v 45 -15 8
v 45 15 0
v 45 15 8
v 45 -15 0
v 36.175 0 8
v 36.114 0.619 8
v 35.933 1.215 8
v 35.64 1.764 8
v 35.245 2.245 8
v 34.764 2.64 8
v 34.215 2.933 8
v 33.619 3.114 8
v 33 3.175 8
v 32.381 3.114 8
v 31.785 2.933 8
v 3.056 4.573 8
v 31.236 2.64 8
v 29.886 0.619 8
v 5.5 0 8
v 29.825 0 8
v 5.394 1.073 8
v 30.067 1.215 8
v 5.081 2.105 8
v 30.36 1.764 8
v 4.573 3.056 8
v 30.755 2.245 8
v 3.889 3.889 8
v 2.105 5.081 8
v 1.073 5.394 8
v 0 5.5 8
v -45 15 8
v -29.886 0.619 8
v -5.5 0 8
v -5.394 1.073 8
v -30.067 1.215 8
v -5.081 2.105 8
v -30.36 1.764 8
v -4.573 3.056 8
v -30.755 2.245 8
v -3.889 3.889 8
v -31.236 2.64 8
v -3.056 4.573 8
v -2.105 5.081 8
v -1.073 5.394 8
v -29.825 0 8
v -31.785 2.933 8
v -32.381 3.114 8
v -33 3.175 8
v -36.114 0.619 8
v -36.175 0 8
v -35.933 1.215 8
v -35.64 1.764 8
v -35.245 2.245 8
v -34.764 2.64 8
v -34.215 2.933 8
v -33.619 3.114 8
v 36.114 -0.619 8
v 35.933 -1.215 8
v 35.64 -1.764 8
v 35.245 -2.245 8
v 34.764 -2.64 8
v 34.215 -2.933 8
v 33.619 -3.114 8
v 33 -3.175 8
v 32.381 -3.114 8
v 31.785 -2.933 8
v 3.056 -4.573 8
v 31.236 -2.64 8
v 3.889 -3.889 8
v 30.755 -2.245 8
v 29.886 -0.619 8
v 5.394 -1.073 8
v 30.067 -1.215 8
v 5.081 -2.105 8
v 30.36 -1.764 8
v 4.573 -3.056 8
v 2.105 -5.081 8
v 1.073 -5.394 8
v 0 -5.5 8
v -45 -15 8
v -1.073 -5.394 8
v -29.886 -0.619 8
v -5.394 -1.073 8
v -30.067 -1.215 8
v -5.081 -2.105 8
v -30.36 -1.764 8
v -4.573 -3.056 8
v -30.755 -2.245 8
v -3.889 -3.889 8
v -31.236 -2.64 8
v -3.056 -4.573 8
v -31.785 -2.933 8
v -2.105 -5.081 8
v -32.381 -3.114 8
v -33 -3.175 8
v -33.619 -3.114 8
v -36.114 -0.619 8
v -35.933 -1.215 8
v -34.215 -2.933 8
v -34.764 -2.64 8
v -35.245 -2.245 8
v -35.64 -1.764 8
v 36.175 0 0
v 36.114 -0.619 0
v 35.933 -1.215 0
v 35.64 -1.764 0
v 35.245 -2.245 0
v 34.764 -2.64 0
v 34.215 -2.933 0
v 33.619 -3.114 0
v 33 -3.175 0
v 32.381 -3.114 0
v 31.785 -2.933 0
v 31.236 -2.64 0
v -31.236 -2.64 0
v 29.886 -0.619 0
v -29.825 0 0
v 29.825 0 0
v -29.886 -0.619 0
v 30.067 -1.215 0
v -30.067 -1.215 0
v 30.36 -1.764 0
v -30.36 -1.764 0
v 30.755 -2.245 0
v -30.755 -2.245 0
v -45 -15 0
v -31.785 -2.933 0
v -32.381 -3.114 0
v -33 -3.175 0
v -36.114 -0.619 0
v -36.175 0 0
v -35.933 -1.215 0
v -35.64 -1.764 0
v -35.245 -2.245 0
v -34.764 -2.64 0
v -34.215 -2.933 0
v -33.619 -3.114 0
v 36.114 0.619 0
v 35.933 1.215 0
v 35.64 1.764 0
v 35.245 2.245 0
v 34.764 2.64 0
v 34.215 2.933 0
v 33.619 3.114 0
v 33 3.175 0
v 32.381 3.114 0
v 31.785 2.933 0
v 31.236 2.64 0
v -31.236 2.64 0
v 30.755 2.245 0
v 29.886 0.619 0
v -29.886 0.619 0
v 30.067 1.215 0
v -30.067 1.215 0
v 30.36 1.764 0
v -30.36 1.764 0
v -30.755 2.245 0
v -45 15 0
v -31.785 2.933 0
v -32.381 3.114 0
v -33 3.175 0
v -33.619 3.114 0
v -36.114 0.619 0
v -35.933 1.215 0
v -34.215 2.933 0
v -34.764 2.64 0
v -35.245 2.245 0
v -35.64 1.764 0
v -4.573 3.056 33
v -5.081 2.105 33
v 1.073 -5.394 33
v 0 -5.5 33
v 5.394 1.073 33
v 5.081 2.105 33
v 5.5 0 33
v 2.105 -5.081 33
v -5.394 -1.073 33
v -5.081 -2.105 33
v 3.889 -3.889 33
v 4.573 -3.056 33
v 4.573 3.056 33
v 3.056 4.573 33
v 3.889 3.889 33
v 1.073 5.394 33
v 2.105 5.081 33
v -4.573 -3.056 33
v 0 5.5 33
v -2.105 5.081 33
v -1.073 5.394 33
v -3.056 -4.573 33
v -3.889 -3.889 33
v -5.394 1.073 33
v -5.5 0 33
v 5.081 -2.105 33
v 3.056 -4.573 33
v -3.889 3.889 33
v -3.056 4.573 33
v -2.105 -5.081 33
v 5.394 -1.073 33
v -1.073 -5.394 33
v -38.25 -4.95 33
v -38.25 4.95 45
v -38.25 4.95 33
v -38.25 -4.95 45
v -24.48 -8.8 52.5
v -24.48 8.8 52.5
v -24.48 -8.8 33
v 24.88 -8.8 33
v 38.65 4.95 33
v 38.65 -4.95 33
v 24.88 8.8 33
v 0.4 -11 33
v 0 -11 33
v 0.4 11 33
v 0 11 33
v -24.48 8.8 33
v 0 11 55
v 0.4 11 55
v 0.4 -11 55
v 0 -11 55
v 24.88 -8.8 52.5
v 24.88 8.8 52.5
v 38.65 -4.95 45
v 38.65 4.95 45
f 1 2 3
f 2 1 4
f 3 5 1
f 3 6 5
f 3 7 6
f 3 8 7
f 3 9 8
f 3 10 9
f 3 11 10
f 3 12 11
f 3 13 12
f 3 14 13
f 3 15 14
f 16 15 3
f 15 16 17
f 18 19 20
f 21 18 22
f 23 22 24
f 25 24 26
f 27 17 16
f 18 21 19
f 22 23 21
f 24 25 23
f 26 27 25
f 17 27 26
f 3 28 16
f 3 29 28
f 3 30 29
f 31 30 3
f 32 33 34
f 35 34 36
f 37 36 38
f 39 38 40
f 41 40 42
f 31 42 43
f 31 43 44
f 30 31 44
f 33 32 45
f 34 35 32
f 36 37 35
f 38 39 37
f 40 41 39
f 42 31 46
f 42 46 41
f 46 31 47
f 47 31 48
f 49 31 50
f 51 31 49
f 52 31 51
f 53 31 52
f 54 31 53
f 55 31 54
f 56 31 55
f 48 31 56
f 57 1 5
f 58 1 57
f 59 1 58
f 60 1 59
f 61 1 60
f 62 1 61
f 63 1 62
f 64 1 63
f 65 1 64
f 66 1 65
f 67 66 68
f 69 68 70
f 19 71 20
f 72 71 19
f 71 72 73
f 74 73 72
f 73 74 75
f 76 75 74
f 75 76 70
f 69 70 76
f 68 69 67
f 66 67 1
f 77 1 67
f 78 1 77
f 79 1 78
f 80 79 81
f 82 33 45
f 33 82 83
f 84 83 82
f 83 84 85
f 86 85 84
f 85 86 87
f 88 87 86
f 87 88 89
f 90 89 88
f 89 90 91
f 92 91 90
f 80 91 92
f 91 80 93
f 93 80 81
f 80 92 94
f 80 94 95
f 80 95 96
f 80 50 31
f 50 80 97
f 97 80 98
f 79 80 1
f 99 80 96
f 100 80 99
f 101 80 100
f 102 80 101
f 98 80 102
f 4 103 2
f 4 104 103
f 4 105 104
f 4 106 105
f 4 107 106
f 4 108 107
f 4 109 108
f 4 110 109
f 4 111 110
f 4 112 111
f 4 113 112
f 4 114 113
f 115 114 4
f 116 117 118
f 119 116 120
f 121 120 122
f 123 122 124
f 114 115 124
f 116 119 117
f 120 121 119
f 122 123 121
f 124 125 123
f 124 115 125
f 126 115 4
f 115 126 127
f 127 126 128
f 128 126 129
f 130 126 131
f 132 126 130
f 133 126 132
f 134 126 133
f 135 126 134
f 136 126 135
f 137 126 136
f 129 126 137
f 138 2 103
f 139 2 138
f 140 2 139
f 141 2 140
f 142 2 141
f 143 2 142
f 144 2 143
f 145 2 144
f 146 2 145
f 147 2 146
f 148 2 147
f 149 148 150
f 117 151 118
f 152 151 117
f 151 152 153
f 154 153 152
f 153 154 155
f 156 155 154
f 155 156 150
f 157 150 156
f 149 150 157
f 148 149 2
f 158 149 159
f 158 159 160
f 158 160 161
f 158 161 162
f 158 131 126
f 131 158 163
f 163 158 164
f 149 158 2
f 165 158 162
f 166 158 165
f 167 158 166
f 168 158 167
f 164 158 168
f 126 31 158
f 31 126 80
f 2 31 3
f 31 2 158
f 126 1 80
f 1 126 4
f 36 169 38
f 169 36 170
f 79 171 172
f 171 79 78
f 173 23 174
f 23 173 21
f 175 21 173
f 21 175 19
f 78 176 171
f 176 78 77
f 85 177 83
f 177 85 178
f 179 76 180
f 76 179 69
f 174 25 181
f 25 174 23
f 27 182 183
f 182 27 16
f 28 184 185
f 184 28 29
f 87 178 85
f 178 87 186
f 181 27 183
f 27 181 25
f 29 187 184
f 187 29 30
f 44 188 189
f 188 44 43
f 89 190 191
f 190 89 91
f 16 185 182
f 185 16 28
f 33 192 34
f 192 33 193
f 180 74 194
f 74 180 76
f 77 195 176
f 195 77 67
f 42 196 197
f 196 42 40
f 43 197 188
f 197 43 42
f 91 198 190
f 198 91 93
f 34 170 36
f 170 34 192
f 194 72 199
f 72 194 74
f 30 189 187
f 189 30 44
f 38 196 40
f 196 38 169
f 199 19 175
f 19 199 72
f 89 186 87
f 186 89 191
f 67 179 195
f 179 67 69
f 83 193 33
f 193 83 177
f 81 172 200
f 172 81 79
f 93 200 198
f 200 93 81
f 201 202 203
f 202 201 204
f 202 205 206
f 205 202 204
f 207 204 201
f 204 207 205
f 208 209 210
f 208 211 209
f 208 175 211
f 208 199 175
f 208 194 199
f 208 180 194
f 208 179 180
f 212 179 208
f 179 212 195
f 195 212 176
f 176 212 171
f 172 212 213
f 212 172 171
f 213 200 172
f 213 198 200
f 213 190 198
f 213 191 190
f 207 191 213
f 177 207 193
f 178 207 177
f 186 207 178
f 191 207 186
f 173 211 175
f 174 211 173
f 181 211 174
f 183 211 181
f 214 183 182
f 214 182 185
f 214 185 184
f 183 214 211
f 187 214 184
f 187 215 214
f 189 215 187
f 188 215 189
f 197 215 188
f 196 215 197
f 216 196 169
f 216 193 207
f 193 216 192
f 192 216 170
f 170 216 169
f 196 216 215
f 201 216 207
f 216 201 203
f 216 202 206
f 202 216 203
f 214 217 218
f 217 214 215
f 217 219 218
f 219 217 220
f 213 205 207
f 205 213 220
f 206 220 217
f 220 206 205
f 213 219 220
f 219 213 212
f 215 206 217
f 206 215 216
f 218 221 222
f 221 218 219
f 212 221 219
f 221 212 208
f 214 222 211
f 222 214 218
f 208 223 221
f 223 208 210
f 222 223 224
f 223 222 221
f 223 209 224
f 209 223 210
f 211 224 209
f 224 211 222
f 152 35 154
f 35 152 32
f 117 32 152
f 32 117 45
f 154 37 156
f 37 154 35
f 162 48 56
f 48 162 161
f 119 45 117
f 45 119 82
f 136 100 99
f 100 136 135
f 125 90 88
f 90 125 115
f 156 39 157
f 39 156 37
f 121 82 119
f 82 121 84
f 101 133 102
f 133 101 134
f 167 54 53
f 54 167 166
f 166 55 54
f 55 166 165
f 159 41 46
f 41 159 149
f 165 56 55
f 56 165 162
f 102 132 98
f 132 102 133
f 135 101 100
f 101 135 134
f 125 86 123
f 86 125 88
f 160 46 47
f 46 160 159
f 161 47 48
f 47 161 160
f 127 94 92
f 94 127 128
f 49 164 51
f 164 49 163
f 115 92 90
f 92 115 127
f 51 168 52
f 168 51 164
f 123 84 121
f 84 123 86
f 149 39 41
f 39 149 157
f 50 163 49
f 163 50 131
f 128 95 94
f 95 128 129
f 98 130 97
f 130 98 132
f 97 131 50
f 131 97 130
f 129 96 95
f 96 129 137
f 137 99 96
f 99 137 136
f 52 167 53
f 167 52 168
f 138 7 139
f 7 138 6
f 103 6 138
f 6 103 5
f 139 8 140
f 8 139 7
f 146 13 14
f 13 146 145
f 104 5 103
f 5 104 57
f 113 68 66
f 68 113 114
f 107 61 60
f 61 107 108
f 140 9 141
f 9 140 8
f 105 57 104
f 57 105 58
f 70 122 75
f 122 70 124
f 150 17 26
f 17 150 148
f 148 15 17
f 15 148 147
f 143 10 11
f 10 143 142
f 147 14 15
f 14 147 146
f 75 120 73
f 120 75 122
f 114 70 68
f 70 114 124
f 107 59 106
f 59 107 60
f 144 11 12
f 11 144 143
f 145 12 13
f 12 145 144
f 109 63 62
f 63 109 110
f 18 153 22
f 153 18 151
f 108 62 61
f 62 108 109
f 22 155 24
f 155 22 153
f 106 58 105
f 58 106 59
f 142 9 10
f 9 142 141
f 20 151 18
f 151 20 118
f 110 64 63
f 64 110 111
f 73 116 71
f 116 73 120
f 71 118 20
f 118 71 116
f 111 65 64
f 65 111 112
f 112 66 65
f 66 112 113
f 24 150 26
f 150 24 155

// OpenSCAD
$fn = 32;

// ----------------------------------------------------------------------
// Boat cleat: 90 mm base, horn 44 mm up
// ----------------------------------------------------------------------

// --- parameters (mm) ---
base_l = 90;              // base length
base_w = 30;              // base width
base_t = 8;               // base thickness
horn_len = 76.5;          // horn length
horn_d = 22;              // horn diameter at the middle
horn_z = 44;              // horn axis height
end_drop = 10;            // how far the horn tips drop
post_d = 11;              // centre post diameter
holes_d = 6.35;           // fixing holes
hole_x = 33;              // fixing hole spacing

difference() {
  union() {
    translate([-45, -15, 0]) cube([base_l, base_w, base_t]);
    /* centre post, sunk 1 mm into the base */
    translate([0, 0, 7]) cylinder(h = 37, d = post_d);
    /* horn: a hull chain of boxes, full in the middle and lighter at the tips */
    hull() {
      translate([-38.25, -4.95, 33]) cube([0.4, 9.9, 12], center = false);
      translate([-24.48, -8.8, 33]) cube([0.4, 17.6, 19.5], center = false);
    }
    hull() {
      translate([-24.48, -8.8, 33]) cube([0.4, 17.6, 19.5], center = false);
      translate([0, -11, 33]) cube([0.4, 22, 22], center = false);
    }
    hull() {
      translate([0, -11, 33]) cube([0.4, 22, 22], center = false);
      translate([24.48, -8.8, 33]) cube([0.4, 17.6, 19.5], center = false);
    }
    hull() {
      translate([24.48, -8.8, 33]) cube([0.4, 17.6, 19.5], center = false);
      translate([38.25, -4.95, 33]) cube([0.4, 9.9, 12], center = false);
    }
  }
  translate([-33, 0, -2.5]) cylinder(h = base_t + 5, d = holes_d);
  translate([33, 0, -2.5]) cylinder(h = base_t + 5, d = holes_d);
}
